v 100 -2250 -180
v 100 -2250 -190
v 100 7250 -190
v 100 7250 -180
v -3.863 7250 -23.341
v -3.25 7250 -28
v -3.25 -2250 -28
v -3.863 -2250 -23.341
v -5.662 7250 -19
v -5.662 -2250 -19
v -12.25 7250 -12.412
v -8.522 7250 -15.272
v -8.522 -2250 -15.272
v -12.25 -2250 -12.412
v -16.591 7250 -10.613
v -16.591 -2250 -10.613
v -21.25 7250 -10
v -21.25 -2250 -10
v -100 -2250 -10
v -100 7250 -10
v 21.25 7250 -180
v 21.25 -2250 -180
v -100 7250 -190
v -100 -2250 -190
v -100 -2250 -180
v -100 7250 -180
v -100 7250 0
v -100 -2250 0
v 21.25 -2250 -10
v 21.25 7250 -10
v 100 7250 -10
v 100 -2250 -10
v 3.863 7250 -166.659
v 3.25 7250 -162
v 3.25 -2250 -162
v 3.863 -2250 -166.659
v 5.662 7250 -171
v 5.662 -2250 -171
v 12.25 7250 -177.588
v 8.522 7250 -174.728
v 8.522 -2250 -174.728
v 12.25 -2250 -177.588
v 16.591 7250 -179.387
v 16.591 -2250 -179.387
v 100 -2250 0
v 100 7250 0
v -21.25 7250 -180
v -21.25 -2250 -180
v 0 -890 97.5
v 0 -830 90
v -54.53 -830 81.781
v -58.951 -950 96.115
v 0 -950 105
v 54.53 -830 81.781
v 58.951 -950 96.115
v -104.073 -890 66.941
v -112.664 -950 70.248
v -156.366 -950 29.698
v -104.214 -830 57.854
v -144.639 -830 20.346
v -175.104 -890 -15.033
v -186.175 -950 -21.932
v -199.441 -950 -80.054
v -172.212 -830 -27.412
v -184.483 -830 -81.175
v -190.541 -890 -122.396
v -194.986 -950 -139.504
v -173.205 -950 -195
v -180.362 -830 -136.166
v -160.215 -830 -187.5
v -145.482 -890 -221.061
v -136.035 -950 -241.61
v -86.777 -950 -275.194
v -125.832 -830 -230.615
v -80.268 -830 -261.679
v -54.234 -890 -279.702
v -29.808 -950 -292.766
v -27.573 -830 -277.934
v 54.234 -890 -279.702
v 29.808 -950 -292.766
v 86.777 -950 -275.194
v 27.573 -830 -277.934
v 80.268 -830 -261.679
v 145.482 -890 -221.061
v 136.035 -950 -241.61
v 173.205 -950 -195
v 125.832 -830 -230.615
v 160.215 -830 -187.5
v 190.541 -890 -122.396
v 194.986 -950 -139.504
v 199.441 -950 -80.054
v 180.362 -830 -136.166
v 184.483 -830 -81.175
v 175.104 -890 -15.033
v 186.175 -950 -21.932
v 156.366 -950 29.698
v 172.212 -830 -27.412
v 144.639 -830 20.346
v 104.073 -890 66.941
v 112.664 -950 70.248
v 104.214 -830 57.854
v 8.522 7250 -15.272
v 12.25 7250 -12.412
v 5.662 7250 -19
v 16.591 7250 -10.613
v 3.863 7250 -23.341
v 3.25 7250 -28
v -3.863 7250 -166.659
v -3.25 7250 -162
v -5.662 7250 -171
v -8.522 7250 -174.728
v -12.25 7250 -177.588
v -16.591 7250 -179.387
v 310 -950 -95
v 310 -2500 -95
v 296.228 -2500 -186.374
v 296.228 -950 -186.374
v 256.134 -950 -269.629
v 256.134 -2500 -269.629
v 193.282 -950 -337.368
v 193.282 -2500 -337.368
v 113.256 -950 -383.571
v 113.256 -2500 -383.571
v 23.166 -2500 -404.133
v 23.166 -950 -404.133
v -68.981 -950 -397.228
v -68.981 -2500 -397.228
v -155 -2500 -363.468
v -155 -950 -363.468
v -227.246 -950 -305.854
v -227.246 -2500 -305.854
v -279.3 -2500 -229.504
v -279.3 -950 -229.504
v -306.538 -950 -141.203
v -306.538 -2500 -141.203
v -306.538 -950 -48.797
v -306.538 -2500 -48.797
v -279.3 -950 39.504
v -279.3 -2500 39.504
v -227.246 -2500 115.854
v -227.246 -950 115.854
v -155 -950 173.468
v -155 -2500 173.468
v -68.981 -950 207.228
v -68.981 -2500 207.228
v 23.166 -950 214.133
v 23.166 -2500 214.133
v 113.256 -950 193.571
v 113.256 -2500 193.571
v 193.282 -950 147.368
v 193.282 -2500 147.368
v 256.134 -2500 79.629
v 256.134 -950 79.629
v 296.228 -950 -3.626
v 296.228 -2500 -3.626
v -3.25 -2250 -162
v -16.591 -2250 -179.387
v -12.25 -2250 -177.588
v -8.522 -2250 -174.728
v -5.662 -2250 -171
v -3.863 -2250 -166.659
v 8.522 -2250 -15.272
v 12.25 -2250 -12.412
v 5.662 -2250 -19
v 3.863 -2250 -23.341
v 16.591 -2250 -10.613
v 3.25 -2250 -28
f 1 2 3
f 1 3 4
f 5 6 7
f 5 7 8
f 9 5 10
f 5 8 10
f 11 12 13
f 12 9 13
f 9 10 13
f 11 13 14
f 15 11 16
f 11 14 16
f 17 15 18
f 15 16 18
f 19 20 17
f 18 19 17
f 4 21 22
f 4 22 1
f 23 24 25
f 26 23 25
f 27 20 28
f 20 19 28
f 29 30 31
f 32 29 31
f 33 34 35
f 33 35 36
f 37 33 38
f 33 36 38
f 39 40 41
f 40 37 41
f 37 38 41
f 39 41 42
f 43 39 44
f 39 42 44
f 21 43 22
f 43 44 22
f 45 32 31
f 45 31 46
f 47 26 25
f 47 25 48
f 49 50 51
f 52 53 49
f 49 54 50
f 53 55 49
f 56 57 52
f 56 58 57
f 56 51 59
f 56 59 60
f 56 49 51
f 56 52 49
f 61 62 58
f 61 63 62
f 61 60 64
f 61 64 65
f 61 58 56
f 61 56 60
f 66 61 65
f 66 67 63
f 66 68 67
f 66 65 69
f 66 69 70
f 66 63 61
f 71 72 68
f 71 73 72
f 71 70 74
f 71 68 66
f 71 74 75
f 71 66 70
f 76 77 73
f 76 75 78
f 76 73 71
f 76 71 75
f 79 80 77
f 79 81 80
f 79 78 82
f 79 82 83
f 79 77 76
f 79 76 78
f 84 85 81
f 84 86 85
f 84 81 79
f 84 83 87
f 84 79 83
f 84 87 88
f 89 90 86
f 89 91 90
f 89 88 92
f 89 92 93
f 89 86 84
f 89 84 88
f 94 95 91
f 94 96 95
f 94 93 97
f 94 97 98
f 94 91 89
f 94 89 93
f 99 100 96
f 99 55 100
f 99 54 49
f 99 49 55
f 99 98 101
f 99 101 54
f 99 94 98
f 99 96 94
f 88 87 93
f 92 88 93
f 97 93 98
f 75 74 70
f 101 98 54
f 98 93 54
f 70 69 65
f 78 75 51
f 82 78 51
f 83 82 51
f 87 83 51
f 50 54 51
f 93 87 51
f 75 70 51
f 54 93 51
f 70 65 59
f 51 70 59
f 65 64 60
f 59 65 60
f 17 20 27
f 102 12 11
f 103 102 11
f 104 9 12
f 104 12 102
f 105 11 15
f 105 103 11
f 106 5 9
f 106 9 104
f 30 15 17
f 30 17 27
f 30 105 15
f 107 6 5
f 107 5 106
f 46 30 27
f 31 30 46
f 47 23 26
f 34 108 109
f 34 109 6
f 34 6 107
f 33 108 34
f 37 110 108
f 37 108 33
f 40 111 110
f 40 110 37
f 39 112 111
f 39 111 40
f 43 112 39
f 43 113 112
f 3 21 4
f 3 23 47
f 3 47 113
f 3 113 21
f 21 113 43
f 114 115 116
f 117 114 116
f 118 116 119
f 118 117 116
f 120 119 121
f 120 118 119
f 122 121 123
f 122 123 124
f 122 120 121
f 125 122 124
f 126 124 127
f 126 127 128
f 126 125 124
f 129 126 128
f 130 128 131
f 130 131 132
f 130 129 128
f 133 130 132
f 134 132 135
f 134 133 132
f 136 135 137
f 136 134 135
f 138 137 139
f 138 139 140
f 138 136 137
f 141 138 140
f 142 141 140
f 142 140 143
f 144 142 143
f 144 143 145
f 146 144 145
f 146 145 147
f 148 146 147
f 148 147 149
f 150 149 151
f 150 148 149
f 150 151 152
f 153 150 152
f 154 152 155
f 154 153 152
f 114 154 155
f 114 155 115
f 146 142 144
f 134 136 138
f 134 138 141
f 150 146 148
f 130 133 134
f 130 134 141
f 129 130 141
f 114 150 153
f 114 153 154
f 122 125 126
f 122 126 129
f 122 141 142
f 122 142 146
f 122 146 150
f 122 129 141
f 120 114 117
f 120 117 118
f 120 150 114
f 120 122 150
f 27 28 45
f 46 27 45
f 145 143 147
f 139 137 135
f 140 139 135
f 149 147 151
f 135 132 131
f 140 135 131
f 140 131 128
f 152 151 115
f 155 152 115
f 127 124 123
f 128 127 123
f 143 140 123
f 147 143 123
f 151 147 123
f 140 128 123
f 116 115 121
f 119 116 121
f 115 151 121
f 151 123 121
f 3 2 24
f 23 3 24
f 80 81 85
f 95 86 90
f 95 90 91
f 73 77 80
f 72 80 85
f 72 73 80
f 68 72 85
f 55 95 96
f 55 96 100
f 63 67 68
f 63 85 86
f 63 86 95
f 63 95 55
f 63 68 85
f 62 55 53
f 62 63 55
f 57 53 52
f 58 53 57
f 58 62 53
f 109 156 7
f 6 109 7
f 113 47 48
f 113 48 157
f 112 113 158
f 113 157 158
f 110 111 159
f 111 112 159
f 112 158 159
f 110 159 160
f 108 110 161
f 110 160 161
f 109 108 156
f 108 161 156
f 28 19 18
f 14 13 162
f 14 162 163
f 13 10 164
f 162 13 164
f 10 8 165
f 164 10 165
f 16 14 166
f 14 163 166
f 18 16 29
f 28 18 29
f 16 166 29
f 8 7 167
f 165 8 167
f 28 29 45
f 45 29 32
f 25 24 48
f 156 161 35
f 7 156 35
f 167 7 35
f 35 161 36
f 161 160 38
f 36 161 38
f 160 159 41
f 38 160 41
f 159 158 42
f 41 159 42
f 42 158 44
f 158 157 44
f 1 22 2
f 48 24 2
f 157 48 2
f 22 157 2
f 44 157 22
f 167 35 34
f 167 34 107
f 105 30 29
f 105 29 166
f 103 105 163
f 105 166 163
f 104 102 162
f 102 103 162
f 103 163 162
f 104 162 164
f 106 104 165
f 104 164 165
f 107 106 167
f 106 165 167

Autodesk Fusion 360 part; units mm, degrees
sketch "Sketch1" plane through (0, 0, 0) normal (0, 1, 0) x (1, 0, 0)
  line L0 (0, 0) -> (100, 0) construction
  line L1 (100, 0) -> (100, 190) construction
  line L2 (100, 190) -> (-100, 190) construction
  line L3 (-100, 190) -> (-100, 0) construction
  line L4 (-100, 0) -> (0, 0) construction
  line L5 (-100, 10) -> (-100, 0)
  line L6 (-100, 0) -> (100, 0)
  line L7 (100, 10) -> (100, 0)
  line L8 (100, 190) -> (100, 180)
  line L9 (100, 190) -> (-100, 190)
  line L10 (-100, 190) -> (-100, 180)
  line L11 (0, 190) -> (0, 0) construction
  line L12 (-3.25, 162) -> (-3.25, 28)
  line L13 (3.25, 162) -> (3.25, 28)
  line L14 (-100, 10) -> (-21.25, 10)
  line L15 (21.25, 10) -> (100, 10)
  line L16 (-100, 180) -> (-21.25, 180)
  line L17 (21.25, 180) -> (100, 180)
  arc A0 (-3.25, 162) -> (-21.25, 180) centre (-21.25, 162) ccw
  arc A1 (21.25, 180) -> (3.25, 162) centre (21.25, 162) ccw
  arc A2 (3.25, 28) -> (21.25, 10) centre (21.25, 28) ccw
  arc A3 (-21.25, 10) -> (-3.25, 28) centre (-21.25, 28) ccw
  dimension "d7" = 100
  dimension "d8" = 190
  dimension "d9" = 200
  dimension "d10" = 190
  dimension "d12" = 10
  dimension "d13" = 10
  dimension "d14" = 3.25
  dimension "d15" = 3.25
  dimension "d16" = 18
extrude "Extrude1" add sketch "Sketch1" along normal blind 7250 and the other way blind 2250 makes body 1
ref_plane "WorkPlane1" through (0, -950, 0) normal (0, 1, 0) x (0, 0, 1)
ref_plane "WorkPlane2" through (0, -2500, 0) normal (0, 1, 0) x (0, 0, 1)
sketch "Sketch2" plane through (0, -950, 0) normal (0, 1, 0) x (1, 0, 0)
  line L0 (0, 0) -> (0, 95)
  circle A0 centre (0, 95) radius 310
  dimension "d23" = 95
  dimension "d24" = 620
extrude "Extrude2" add sketch "Sketch2" against normal blind 1550 separate body makes body 2
sketch "Sketch4" plane through (0, 0, 0) normal (1, 0, 0) x (0, 0, -1)
  line L0 (95, -950) -> (-105, -950)
  line L1 (-105, -950) -> (-105, -830) construction
  line L2 (95, -950) -> (95, -830) construction
  line L3 (95, -830) -> (-105, -830) construction
  line L4 (95, -830) -> (-90, -830)
  line L5 (-90, -830) -> (-105, -950)
  line L6 (95, -830) -> (95, -950)
  point P0 (95, -950)
  dimension "d28" = 200
  dimension "d29" = 120
  dimension "d30" = 120
  dimension "d31" = 185
revolve "Revolve1" add sketch "Sketch4" angle 360 about axis through (0, -830, -95) along (0, -1, 0) separate body makes body 3
sketch "Sketch de construction - Positionnement piquetage" plane through (0, 0, 0) normal (0, 1, 0) x (1, 0, 0)
  circle A0 centre (0, 95) radius 310 construction
  line L0 (0, 0) -> (0, 95) construction
  line L1 (0, 0) -> (-295.0847, 0) construction
  line L2 (0, 0) -> (295.0847, 0) construction
equation "d14 = ( 6.5 / 2 ) * 1 mm"
